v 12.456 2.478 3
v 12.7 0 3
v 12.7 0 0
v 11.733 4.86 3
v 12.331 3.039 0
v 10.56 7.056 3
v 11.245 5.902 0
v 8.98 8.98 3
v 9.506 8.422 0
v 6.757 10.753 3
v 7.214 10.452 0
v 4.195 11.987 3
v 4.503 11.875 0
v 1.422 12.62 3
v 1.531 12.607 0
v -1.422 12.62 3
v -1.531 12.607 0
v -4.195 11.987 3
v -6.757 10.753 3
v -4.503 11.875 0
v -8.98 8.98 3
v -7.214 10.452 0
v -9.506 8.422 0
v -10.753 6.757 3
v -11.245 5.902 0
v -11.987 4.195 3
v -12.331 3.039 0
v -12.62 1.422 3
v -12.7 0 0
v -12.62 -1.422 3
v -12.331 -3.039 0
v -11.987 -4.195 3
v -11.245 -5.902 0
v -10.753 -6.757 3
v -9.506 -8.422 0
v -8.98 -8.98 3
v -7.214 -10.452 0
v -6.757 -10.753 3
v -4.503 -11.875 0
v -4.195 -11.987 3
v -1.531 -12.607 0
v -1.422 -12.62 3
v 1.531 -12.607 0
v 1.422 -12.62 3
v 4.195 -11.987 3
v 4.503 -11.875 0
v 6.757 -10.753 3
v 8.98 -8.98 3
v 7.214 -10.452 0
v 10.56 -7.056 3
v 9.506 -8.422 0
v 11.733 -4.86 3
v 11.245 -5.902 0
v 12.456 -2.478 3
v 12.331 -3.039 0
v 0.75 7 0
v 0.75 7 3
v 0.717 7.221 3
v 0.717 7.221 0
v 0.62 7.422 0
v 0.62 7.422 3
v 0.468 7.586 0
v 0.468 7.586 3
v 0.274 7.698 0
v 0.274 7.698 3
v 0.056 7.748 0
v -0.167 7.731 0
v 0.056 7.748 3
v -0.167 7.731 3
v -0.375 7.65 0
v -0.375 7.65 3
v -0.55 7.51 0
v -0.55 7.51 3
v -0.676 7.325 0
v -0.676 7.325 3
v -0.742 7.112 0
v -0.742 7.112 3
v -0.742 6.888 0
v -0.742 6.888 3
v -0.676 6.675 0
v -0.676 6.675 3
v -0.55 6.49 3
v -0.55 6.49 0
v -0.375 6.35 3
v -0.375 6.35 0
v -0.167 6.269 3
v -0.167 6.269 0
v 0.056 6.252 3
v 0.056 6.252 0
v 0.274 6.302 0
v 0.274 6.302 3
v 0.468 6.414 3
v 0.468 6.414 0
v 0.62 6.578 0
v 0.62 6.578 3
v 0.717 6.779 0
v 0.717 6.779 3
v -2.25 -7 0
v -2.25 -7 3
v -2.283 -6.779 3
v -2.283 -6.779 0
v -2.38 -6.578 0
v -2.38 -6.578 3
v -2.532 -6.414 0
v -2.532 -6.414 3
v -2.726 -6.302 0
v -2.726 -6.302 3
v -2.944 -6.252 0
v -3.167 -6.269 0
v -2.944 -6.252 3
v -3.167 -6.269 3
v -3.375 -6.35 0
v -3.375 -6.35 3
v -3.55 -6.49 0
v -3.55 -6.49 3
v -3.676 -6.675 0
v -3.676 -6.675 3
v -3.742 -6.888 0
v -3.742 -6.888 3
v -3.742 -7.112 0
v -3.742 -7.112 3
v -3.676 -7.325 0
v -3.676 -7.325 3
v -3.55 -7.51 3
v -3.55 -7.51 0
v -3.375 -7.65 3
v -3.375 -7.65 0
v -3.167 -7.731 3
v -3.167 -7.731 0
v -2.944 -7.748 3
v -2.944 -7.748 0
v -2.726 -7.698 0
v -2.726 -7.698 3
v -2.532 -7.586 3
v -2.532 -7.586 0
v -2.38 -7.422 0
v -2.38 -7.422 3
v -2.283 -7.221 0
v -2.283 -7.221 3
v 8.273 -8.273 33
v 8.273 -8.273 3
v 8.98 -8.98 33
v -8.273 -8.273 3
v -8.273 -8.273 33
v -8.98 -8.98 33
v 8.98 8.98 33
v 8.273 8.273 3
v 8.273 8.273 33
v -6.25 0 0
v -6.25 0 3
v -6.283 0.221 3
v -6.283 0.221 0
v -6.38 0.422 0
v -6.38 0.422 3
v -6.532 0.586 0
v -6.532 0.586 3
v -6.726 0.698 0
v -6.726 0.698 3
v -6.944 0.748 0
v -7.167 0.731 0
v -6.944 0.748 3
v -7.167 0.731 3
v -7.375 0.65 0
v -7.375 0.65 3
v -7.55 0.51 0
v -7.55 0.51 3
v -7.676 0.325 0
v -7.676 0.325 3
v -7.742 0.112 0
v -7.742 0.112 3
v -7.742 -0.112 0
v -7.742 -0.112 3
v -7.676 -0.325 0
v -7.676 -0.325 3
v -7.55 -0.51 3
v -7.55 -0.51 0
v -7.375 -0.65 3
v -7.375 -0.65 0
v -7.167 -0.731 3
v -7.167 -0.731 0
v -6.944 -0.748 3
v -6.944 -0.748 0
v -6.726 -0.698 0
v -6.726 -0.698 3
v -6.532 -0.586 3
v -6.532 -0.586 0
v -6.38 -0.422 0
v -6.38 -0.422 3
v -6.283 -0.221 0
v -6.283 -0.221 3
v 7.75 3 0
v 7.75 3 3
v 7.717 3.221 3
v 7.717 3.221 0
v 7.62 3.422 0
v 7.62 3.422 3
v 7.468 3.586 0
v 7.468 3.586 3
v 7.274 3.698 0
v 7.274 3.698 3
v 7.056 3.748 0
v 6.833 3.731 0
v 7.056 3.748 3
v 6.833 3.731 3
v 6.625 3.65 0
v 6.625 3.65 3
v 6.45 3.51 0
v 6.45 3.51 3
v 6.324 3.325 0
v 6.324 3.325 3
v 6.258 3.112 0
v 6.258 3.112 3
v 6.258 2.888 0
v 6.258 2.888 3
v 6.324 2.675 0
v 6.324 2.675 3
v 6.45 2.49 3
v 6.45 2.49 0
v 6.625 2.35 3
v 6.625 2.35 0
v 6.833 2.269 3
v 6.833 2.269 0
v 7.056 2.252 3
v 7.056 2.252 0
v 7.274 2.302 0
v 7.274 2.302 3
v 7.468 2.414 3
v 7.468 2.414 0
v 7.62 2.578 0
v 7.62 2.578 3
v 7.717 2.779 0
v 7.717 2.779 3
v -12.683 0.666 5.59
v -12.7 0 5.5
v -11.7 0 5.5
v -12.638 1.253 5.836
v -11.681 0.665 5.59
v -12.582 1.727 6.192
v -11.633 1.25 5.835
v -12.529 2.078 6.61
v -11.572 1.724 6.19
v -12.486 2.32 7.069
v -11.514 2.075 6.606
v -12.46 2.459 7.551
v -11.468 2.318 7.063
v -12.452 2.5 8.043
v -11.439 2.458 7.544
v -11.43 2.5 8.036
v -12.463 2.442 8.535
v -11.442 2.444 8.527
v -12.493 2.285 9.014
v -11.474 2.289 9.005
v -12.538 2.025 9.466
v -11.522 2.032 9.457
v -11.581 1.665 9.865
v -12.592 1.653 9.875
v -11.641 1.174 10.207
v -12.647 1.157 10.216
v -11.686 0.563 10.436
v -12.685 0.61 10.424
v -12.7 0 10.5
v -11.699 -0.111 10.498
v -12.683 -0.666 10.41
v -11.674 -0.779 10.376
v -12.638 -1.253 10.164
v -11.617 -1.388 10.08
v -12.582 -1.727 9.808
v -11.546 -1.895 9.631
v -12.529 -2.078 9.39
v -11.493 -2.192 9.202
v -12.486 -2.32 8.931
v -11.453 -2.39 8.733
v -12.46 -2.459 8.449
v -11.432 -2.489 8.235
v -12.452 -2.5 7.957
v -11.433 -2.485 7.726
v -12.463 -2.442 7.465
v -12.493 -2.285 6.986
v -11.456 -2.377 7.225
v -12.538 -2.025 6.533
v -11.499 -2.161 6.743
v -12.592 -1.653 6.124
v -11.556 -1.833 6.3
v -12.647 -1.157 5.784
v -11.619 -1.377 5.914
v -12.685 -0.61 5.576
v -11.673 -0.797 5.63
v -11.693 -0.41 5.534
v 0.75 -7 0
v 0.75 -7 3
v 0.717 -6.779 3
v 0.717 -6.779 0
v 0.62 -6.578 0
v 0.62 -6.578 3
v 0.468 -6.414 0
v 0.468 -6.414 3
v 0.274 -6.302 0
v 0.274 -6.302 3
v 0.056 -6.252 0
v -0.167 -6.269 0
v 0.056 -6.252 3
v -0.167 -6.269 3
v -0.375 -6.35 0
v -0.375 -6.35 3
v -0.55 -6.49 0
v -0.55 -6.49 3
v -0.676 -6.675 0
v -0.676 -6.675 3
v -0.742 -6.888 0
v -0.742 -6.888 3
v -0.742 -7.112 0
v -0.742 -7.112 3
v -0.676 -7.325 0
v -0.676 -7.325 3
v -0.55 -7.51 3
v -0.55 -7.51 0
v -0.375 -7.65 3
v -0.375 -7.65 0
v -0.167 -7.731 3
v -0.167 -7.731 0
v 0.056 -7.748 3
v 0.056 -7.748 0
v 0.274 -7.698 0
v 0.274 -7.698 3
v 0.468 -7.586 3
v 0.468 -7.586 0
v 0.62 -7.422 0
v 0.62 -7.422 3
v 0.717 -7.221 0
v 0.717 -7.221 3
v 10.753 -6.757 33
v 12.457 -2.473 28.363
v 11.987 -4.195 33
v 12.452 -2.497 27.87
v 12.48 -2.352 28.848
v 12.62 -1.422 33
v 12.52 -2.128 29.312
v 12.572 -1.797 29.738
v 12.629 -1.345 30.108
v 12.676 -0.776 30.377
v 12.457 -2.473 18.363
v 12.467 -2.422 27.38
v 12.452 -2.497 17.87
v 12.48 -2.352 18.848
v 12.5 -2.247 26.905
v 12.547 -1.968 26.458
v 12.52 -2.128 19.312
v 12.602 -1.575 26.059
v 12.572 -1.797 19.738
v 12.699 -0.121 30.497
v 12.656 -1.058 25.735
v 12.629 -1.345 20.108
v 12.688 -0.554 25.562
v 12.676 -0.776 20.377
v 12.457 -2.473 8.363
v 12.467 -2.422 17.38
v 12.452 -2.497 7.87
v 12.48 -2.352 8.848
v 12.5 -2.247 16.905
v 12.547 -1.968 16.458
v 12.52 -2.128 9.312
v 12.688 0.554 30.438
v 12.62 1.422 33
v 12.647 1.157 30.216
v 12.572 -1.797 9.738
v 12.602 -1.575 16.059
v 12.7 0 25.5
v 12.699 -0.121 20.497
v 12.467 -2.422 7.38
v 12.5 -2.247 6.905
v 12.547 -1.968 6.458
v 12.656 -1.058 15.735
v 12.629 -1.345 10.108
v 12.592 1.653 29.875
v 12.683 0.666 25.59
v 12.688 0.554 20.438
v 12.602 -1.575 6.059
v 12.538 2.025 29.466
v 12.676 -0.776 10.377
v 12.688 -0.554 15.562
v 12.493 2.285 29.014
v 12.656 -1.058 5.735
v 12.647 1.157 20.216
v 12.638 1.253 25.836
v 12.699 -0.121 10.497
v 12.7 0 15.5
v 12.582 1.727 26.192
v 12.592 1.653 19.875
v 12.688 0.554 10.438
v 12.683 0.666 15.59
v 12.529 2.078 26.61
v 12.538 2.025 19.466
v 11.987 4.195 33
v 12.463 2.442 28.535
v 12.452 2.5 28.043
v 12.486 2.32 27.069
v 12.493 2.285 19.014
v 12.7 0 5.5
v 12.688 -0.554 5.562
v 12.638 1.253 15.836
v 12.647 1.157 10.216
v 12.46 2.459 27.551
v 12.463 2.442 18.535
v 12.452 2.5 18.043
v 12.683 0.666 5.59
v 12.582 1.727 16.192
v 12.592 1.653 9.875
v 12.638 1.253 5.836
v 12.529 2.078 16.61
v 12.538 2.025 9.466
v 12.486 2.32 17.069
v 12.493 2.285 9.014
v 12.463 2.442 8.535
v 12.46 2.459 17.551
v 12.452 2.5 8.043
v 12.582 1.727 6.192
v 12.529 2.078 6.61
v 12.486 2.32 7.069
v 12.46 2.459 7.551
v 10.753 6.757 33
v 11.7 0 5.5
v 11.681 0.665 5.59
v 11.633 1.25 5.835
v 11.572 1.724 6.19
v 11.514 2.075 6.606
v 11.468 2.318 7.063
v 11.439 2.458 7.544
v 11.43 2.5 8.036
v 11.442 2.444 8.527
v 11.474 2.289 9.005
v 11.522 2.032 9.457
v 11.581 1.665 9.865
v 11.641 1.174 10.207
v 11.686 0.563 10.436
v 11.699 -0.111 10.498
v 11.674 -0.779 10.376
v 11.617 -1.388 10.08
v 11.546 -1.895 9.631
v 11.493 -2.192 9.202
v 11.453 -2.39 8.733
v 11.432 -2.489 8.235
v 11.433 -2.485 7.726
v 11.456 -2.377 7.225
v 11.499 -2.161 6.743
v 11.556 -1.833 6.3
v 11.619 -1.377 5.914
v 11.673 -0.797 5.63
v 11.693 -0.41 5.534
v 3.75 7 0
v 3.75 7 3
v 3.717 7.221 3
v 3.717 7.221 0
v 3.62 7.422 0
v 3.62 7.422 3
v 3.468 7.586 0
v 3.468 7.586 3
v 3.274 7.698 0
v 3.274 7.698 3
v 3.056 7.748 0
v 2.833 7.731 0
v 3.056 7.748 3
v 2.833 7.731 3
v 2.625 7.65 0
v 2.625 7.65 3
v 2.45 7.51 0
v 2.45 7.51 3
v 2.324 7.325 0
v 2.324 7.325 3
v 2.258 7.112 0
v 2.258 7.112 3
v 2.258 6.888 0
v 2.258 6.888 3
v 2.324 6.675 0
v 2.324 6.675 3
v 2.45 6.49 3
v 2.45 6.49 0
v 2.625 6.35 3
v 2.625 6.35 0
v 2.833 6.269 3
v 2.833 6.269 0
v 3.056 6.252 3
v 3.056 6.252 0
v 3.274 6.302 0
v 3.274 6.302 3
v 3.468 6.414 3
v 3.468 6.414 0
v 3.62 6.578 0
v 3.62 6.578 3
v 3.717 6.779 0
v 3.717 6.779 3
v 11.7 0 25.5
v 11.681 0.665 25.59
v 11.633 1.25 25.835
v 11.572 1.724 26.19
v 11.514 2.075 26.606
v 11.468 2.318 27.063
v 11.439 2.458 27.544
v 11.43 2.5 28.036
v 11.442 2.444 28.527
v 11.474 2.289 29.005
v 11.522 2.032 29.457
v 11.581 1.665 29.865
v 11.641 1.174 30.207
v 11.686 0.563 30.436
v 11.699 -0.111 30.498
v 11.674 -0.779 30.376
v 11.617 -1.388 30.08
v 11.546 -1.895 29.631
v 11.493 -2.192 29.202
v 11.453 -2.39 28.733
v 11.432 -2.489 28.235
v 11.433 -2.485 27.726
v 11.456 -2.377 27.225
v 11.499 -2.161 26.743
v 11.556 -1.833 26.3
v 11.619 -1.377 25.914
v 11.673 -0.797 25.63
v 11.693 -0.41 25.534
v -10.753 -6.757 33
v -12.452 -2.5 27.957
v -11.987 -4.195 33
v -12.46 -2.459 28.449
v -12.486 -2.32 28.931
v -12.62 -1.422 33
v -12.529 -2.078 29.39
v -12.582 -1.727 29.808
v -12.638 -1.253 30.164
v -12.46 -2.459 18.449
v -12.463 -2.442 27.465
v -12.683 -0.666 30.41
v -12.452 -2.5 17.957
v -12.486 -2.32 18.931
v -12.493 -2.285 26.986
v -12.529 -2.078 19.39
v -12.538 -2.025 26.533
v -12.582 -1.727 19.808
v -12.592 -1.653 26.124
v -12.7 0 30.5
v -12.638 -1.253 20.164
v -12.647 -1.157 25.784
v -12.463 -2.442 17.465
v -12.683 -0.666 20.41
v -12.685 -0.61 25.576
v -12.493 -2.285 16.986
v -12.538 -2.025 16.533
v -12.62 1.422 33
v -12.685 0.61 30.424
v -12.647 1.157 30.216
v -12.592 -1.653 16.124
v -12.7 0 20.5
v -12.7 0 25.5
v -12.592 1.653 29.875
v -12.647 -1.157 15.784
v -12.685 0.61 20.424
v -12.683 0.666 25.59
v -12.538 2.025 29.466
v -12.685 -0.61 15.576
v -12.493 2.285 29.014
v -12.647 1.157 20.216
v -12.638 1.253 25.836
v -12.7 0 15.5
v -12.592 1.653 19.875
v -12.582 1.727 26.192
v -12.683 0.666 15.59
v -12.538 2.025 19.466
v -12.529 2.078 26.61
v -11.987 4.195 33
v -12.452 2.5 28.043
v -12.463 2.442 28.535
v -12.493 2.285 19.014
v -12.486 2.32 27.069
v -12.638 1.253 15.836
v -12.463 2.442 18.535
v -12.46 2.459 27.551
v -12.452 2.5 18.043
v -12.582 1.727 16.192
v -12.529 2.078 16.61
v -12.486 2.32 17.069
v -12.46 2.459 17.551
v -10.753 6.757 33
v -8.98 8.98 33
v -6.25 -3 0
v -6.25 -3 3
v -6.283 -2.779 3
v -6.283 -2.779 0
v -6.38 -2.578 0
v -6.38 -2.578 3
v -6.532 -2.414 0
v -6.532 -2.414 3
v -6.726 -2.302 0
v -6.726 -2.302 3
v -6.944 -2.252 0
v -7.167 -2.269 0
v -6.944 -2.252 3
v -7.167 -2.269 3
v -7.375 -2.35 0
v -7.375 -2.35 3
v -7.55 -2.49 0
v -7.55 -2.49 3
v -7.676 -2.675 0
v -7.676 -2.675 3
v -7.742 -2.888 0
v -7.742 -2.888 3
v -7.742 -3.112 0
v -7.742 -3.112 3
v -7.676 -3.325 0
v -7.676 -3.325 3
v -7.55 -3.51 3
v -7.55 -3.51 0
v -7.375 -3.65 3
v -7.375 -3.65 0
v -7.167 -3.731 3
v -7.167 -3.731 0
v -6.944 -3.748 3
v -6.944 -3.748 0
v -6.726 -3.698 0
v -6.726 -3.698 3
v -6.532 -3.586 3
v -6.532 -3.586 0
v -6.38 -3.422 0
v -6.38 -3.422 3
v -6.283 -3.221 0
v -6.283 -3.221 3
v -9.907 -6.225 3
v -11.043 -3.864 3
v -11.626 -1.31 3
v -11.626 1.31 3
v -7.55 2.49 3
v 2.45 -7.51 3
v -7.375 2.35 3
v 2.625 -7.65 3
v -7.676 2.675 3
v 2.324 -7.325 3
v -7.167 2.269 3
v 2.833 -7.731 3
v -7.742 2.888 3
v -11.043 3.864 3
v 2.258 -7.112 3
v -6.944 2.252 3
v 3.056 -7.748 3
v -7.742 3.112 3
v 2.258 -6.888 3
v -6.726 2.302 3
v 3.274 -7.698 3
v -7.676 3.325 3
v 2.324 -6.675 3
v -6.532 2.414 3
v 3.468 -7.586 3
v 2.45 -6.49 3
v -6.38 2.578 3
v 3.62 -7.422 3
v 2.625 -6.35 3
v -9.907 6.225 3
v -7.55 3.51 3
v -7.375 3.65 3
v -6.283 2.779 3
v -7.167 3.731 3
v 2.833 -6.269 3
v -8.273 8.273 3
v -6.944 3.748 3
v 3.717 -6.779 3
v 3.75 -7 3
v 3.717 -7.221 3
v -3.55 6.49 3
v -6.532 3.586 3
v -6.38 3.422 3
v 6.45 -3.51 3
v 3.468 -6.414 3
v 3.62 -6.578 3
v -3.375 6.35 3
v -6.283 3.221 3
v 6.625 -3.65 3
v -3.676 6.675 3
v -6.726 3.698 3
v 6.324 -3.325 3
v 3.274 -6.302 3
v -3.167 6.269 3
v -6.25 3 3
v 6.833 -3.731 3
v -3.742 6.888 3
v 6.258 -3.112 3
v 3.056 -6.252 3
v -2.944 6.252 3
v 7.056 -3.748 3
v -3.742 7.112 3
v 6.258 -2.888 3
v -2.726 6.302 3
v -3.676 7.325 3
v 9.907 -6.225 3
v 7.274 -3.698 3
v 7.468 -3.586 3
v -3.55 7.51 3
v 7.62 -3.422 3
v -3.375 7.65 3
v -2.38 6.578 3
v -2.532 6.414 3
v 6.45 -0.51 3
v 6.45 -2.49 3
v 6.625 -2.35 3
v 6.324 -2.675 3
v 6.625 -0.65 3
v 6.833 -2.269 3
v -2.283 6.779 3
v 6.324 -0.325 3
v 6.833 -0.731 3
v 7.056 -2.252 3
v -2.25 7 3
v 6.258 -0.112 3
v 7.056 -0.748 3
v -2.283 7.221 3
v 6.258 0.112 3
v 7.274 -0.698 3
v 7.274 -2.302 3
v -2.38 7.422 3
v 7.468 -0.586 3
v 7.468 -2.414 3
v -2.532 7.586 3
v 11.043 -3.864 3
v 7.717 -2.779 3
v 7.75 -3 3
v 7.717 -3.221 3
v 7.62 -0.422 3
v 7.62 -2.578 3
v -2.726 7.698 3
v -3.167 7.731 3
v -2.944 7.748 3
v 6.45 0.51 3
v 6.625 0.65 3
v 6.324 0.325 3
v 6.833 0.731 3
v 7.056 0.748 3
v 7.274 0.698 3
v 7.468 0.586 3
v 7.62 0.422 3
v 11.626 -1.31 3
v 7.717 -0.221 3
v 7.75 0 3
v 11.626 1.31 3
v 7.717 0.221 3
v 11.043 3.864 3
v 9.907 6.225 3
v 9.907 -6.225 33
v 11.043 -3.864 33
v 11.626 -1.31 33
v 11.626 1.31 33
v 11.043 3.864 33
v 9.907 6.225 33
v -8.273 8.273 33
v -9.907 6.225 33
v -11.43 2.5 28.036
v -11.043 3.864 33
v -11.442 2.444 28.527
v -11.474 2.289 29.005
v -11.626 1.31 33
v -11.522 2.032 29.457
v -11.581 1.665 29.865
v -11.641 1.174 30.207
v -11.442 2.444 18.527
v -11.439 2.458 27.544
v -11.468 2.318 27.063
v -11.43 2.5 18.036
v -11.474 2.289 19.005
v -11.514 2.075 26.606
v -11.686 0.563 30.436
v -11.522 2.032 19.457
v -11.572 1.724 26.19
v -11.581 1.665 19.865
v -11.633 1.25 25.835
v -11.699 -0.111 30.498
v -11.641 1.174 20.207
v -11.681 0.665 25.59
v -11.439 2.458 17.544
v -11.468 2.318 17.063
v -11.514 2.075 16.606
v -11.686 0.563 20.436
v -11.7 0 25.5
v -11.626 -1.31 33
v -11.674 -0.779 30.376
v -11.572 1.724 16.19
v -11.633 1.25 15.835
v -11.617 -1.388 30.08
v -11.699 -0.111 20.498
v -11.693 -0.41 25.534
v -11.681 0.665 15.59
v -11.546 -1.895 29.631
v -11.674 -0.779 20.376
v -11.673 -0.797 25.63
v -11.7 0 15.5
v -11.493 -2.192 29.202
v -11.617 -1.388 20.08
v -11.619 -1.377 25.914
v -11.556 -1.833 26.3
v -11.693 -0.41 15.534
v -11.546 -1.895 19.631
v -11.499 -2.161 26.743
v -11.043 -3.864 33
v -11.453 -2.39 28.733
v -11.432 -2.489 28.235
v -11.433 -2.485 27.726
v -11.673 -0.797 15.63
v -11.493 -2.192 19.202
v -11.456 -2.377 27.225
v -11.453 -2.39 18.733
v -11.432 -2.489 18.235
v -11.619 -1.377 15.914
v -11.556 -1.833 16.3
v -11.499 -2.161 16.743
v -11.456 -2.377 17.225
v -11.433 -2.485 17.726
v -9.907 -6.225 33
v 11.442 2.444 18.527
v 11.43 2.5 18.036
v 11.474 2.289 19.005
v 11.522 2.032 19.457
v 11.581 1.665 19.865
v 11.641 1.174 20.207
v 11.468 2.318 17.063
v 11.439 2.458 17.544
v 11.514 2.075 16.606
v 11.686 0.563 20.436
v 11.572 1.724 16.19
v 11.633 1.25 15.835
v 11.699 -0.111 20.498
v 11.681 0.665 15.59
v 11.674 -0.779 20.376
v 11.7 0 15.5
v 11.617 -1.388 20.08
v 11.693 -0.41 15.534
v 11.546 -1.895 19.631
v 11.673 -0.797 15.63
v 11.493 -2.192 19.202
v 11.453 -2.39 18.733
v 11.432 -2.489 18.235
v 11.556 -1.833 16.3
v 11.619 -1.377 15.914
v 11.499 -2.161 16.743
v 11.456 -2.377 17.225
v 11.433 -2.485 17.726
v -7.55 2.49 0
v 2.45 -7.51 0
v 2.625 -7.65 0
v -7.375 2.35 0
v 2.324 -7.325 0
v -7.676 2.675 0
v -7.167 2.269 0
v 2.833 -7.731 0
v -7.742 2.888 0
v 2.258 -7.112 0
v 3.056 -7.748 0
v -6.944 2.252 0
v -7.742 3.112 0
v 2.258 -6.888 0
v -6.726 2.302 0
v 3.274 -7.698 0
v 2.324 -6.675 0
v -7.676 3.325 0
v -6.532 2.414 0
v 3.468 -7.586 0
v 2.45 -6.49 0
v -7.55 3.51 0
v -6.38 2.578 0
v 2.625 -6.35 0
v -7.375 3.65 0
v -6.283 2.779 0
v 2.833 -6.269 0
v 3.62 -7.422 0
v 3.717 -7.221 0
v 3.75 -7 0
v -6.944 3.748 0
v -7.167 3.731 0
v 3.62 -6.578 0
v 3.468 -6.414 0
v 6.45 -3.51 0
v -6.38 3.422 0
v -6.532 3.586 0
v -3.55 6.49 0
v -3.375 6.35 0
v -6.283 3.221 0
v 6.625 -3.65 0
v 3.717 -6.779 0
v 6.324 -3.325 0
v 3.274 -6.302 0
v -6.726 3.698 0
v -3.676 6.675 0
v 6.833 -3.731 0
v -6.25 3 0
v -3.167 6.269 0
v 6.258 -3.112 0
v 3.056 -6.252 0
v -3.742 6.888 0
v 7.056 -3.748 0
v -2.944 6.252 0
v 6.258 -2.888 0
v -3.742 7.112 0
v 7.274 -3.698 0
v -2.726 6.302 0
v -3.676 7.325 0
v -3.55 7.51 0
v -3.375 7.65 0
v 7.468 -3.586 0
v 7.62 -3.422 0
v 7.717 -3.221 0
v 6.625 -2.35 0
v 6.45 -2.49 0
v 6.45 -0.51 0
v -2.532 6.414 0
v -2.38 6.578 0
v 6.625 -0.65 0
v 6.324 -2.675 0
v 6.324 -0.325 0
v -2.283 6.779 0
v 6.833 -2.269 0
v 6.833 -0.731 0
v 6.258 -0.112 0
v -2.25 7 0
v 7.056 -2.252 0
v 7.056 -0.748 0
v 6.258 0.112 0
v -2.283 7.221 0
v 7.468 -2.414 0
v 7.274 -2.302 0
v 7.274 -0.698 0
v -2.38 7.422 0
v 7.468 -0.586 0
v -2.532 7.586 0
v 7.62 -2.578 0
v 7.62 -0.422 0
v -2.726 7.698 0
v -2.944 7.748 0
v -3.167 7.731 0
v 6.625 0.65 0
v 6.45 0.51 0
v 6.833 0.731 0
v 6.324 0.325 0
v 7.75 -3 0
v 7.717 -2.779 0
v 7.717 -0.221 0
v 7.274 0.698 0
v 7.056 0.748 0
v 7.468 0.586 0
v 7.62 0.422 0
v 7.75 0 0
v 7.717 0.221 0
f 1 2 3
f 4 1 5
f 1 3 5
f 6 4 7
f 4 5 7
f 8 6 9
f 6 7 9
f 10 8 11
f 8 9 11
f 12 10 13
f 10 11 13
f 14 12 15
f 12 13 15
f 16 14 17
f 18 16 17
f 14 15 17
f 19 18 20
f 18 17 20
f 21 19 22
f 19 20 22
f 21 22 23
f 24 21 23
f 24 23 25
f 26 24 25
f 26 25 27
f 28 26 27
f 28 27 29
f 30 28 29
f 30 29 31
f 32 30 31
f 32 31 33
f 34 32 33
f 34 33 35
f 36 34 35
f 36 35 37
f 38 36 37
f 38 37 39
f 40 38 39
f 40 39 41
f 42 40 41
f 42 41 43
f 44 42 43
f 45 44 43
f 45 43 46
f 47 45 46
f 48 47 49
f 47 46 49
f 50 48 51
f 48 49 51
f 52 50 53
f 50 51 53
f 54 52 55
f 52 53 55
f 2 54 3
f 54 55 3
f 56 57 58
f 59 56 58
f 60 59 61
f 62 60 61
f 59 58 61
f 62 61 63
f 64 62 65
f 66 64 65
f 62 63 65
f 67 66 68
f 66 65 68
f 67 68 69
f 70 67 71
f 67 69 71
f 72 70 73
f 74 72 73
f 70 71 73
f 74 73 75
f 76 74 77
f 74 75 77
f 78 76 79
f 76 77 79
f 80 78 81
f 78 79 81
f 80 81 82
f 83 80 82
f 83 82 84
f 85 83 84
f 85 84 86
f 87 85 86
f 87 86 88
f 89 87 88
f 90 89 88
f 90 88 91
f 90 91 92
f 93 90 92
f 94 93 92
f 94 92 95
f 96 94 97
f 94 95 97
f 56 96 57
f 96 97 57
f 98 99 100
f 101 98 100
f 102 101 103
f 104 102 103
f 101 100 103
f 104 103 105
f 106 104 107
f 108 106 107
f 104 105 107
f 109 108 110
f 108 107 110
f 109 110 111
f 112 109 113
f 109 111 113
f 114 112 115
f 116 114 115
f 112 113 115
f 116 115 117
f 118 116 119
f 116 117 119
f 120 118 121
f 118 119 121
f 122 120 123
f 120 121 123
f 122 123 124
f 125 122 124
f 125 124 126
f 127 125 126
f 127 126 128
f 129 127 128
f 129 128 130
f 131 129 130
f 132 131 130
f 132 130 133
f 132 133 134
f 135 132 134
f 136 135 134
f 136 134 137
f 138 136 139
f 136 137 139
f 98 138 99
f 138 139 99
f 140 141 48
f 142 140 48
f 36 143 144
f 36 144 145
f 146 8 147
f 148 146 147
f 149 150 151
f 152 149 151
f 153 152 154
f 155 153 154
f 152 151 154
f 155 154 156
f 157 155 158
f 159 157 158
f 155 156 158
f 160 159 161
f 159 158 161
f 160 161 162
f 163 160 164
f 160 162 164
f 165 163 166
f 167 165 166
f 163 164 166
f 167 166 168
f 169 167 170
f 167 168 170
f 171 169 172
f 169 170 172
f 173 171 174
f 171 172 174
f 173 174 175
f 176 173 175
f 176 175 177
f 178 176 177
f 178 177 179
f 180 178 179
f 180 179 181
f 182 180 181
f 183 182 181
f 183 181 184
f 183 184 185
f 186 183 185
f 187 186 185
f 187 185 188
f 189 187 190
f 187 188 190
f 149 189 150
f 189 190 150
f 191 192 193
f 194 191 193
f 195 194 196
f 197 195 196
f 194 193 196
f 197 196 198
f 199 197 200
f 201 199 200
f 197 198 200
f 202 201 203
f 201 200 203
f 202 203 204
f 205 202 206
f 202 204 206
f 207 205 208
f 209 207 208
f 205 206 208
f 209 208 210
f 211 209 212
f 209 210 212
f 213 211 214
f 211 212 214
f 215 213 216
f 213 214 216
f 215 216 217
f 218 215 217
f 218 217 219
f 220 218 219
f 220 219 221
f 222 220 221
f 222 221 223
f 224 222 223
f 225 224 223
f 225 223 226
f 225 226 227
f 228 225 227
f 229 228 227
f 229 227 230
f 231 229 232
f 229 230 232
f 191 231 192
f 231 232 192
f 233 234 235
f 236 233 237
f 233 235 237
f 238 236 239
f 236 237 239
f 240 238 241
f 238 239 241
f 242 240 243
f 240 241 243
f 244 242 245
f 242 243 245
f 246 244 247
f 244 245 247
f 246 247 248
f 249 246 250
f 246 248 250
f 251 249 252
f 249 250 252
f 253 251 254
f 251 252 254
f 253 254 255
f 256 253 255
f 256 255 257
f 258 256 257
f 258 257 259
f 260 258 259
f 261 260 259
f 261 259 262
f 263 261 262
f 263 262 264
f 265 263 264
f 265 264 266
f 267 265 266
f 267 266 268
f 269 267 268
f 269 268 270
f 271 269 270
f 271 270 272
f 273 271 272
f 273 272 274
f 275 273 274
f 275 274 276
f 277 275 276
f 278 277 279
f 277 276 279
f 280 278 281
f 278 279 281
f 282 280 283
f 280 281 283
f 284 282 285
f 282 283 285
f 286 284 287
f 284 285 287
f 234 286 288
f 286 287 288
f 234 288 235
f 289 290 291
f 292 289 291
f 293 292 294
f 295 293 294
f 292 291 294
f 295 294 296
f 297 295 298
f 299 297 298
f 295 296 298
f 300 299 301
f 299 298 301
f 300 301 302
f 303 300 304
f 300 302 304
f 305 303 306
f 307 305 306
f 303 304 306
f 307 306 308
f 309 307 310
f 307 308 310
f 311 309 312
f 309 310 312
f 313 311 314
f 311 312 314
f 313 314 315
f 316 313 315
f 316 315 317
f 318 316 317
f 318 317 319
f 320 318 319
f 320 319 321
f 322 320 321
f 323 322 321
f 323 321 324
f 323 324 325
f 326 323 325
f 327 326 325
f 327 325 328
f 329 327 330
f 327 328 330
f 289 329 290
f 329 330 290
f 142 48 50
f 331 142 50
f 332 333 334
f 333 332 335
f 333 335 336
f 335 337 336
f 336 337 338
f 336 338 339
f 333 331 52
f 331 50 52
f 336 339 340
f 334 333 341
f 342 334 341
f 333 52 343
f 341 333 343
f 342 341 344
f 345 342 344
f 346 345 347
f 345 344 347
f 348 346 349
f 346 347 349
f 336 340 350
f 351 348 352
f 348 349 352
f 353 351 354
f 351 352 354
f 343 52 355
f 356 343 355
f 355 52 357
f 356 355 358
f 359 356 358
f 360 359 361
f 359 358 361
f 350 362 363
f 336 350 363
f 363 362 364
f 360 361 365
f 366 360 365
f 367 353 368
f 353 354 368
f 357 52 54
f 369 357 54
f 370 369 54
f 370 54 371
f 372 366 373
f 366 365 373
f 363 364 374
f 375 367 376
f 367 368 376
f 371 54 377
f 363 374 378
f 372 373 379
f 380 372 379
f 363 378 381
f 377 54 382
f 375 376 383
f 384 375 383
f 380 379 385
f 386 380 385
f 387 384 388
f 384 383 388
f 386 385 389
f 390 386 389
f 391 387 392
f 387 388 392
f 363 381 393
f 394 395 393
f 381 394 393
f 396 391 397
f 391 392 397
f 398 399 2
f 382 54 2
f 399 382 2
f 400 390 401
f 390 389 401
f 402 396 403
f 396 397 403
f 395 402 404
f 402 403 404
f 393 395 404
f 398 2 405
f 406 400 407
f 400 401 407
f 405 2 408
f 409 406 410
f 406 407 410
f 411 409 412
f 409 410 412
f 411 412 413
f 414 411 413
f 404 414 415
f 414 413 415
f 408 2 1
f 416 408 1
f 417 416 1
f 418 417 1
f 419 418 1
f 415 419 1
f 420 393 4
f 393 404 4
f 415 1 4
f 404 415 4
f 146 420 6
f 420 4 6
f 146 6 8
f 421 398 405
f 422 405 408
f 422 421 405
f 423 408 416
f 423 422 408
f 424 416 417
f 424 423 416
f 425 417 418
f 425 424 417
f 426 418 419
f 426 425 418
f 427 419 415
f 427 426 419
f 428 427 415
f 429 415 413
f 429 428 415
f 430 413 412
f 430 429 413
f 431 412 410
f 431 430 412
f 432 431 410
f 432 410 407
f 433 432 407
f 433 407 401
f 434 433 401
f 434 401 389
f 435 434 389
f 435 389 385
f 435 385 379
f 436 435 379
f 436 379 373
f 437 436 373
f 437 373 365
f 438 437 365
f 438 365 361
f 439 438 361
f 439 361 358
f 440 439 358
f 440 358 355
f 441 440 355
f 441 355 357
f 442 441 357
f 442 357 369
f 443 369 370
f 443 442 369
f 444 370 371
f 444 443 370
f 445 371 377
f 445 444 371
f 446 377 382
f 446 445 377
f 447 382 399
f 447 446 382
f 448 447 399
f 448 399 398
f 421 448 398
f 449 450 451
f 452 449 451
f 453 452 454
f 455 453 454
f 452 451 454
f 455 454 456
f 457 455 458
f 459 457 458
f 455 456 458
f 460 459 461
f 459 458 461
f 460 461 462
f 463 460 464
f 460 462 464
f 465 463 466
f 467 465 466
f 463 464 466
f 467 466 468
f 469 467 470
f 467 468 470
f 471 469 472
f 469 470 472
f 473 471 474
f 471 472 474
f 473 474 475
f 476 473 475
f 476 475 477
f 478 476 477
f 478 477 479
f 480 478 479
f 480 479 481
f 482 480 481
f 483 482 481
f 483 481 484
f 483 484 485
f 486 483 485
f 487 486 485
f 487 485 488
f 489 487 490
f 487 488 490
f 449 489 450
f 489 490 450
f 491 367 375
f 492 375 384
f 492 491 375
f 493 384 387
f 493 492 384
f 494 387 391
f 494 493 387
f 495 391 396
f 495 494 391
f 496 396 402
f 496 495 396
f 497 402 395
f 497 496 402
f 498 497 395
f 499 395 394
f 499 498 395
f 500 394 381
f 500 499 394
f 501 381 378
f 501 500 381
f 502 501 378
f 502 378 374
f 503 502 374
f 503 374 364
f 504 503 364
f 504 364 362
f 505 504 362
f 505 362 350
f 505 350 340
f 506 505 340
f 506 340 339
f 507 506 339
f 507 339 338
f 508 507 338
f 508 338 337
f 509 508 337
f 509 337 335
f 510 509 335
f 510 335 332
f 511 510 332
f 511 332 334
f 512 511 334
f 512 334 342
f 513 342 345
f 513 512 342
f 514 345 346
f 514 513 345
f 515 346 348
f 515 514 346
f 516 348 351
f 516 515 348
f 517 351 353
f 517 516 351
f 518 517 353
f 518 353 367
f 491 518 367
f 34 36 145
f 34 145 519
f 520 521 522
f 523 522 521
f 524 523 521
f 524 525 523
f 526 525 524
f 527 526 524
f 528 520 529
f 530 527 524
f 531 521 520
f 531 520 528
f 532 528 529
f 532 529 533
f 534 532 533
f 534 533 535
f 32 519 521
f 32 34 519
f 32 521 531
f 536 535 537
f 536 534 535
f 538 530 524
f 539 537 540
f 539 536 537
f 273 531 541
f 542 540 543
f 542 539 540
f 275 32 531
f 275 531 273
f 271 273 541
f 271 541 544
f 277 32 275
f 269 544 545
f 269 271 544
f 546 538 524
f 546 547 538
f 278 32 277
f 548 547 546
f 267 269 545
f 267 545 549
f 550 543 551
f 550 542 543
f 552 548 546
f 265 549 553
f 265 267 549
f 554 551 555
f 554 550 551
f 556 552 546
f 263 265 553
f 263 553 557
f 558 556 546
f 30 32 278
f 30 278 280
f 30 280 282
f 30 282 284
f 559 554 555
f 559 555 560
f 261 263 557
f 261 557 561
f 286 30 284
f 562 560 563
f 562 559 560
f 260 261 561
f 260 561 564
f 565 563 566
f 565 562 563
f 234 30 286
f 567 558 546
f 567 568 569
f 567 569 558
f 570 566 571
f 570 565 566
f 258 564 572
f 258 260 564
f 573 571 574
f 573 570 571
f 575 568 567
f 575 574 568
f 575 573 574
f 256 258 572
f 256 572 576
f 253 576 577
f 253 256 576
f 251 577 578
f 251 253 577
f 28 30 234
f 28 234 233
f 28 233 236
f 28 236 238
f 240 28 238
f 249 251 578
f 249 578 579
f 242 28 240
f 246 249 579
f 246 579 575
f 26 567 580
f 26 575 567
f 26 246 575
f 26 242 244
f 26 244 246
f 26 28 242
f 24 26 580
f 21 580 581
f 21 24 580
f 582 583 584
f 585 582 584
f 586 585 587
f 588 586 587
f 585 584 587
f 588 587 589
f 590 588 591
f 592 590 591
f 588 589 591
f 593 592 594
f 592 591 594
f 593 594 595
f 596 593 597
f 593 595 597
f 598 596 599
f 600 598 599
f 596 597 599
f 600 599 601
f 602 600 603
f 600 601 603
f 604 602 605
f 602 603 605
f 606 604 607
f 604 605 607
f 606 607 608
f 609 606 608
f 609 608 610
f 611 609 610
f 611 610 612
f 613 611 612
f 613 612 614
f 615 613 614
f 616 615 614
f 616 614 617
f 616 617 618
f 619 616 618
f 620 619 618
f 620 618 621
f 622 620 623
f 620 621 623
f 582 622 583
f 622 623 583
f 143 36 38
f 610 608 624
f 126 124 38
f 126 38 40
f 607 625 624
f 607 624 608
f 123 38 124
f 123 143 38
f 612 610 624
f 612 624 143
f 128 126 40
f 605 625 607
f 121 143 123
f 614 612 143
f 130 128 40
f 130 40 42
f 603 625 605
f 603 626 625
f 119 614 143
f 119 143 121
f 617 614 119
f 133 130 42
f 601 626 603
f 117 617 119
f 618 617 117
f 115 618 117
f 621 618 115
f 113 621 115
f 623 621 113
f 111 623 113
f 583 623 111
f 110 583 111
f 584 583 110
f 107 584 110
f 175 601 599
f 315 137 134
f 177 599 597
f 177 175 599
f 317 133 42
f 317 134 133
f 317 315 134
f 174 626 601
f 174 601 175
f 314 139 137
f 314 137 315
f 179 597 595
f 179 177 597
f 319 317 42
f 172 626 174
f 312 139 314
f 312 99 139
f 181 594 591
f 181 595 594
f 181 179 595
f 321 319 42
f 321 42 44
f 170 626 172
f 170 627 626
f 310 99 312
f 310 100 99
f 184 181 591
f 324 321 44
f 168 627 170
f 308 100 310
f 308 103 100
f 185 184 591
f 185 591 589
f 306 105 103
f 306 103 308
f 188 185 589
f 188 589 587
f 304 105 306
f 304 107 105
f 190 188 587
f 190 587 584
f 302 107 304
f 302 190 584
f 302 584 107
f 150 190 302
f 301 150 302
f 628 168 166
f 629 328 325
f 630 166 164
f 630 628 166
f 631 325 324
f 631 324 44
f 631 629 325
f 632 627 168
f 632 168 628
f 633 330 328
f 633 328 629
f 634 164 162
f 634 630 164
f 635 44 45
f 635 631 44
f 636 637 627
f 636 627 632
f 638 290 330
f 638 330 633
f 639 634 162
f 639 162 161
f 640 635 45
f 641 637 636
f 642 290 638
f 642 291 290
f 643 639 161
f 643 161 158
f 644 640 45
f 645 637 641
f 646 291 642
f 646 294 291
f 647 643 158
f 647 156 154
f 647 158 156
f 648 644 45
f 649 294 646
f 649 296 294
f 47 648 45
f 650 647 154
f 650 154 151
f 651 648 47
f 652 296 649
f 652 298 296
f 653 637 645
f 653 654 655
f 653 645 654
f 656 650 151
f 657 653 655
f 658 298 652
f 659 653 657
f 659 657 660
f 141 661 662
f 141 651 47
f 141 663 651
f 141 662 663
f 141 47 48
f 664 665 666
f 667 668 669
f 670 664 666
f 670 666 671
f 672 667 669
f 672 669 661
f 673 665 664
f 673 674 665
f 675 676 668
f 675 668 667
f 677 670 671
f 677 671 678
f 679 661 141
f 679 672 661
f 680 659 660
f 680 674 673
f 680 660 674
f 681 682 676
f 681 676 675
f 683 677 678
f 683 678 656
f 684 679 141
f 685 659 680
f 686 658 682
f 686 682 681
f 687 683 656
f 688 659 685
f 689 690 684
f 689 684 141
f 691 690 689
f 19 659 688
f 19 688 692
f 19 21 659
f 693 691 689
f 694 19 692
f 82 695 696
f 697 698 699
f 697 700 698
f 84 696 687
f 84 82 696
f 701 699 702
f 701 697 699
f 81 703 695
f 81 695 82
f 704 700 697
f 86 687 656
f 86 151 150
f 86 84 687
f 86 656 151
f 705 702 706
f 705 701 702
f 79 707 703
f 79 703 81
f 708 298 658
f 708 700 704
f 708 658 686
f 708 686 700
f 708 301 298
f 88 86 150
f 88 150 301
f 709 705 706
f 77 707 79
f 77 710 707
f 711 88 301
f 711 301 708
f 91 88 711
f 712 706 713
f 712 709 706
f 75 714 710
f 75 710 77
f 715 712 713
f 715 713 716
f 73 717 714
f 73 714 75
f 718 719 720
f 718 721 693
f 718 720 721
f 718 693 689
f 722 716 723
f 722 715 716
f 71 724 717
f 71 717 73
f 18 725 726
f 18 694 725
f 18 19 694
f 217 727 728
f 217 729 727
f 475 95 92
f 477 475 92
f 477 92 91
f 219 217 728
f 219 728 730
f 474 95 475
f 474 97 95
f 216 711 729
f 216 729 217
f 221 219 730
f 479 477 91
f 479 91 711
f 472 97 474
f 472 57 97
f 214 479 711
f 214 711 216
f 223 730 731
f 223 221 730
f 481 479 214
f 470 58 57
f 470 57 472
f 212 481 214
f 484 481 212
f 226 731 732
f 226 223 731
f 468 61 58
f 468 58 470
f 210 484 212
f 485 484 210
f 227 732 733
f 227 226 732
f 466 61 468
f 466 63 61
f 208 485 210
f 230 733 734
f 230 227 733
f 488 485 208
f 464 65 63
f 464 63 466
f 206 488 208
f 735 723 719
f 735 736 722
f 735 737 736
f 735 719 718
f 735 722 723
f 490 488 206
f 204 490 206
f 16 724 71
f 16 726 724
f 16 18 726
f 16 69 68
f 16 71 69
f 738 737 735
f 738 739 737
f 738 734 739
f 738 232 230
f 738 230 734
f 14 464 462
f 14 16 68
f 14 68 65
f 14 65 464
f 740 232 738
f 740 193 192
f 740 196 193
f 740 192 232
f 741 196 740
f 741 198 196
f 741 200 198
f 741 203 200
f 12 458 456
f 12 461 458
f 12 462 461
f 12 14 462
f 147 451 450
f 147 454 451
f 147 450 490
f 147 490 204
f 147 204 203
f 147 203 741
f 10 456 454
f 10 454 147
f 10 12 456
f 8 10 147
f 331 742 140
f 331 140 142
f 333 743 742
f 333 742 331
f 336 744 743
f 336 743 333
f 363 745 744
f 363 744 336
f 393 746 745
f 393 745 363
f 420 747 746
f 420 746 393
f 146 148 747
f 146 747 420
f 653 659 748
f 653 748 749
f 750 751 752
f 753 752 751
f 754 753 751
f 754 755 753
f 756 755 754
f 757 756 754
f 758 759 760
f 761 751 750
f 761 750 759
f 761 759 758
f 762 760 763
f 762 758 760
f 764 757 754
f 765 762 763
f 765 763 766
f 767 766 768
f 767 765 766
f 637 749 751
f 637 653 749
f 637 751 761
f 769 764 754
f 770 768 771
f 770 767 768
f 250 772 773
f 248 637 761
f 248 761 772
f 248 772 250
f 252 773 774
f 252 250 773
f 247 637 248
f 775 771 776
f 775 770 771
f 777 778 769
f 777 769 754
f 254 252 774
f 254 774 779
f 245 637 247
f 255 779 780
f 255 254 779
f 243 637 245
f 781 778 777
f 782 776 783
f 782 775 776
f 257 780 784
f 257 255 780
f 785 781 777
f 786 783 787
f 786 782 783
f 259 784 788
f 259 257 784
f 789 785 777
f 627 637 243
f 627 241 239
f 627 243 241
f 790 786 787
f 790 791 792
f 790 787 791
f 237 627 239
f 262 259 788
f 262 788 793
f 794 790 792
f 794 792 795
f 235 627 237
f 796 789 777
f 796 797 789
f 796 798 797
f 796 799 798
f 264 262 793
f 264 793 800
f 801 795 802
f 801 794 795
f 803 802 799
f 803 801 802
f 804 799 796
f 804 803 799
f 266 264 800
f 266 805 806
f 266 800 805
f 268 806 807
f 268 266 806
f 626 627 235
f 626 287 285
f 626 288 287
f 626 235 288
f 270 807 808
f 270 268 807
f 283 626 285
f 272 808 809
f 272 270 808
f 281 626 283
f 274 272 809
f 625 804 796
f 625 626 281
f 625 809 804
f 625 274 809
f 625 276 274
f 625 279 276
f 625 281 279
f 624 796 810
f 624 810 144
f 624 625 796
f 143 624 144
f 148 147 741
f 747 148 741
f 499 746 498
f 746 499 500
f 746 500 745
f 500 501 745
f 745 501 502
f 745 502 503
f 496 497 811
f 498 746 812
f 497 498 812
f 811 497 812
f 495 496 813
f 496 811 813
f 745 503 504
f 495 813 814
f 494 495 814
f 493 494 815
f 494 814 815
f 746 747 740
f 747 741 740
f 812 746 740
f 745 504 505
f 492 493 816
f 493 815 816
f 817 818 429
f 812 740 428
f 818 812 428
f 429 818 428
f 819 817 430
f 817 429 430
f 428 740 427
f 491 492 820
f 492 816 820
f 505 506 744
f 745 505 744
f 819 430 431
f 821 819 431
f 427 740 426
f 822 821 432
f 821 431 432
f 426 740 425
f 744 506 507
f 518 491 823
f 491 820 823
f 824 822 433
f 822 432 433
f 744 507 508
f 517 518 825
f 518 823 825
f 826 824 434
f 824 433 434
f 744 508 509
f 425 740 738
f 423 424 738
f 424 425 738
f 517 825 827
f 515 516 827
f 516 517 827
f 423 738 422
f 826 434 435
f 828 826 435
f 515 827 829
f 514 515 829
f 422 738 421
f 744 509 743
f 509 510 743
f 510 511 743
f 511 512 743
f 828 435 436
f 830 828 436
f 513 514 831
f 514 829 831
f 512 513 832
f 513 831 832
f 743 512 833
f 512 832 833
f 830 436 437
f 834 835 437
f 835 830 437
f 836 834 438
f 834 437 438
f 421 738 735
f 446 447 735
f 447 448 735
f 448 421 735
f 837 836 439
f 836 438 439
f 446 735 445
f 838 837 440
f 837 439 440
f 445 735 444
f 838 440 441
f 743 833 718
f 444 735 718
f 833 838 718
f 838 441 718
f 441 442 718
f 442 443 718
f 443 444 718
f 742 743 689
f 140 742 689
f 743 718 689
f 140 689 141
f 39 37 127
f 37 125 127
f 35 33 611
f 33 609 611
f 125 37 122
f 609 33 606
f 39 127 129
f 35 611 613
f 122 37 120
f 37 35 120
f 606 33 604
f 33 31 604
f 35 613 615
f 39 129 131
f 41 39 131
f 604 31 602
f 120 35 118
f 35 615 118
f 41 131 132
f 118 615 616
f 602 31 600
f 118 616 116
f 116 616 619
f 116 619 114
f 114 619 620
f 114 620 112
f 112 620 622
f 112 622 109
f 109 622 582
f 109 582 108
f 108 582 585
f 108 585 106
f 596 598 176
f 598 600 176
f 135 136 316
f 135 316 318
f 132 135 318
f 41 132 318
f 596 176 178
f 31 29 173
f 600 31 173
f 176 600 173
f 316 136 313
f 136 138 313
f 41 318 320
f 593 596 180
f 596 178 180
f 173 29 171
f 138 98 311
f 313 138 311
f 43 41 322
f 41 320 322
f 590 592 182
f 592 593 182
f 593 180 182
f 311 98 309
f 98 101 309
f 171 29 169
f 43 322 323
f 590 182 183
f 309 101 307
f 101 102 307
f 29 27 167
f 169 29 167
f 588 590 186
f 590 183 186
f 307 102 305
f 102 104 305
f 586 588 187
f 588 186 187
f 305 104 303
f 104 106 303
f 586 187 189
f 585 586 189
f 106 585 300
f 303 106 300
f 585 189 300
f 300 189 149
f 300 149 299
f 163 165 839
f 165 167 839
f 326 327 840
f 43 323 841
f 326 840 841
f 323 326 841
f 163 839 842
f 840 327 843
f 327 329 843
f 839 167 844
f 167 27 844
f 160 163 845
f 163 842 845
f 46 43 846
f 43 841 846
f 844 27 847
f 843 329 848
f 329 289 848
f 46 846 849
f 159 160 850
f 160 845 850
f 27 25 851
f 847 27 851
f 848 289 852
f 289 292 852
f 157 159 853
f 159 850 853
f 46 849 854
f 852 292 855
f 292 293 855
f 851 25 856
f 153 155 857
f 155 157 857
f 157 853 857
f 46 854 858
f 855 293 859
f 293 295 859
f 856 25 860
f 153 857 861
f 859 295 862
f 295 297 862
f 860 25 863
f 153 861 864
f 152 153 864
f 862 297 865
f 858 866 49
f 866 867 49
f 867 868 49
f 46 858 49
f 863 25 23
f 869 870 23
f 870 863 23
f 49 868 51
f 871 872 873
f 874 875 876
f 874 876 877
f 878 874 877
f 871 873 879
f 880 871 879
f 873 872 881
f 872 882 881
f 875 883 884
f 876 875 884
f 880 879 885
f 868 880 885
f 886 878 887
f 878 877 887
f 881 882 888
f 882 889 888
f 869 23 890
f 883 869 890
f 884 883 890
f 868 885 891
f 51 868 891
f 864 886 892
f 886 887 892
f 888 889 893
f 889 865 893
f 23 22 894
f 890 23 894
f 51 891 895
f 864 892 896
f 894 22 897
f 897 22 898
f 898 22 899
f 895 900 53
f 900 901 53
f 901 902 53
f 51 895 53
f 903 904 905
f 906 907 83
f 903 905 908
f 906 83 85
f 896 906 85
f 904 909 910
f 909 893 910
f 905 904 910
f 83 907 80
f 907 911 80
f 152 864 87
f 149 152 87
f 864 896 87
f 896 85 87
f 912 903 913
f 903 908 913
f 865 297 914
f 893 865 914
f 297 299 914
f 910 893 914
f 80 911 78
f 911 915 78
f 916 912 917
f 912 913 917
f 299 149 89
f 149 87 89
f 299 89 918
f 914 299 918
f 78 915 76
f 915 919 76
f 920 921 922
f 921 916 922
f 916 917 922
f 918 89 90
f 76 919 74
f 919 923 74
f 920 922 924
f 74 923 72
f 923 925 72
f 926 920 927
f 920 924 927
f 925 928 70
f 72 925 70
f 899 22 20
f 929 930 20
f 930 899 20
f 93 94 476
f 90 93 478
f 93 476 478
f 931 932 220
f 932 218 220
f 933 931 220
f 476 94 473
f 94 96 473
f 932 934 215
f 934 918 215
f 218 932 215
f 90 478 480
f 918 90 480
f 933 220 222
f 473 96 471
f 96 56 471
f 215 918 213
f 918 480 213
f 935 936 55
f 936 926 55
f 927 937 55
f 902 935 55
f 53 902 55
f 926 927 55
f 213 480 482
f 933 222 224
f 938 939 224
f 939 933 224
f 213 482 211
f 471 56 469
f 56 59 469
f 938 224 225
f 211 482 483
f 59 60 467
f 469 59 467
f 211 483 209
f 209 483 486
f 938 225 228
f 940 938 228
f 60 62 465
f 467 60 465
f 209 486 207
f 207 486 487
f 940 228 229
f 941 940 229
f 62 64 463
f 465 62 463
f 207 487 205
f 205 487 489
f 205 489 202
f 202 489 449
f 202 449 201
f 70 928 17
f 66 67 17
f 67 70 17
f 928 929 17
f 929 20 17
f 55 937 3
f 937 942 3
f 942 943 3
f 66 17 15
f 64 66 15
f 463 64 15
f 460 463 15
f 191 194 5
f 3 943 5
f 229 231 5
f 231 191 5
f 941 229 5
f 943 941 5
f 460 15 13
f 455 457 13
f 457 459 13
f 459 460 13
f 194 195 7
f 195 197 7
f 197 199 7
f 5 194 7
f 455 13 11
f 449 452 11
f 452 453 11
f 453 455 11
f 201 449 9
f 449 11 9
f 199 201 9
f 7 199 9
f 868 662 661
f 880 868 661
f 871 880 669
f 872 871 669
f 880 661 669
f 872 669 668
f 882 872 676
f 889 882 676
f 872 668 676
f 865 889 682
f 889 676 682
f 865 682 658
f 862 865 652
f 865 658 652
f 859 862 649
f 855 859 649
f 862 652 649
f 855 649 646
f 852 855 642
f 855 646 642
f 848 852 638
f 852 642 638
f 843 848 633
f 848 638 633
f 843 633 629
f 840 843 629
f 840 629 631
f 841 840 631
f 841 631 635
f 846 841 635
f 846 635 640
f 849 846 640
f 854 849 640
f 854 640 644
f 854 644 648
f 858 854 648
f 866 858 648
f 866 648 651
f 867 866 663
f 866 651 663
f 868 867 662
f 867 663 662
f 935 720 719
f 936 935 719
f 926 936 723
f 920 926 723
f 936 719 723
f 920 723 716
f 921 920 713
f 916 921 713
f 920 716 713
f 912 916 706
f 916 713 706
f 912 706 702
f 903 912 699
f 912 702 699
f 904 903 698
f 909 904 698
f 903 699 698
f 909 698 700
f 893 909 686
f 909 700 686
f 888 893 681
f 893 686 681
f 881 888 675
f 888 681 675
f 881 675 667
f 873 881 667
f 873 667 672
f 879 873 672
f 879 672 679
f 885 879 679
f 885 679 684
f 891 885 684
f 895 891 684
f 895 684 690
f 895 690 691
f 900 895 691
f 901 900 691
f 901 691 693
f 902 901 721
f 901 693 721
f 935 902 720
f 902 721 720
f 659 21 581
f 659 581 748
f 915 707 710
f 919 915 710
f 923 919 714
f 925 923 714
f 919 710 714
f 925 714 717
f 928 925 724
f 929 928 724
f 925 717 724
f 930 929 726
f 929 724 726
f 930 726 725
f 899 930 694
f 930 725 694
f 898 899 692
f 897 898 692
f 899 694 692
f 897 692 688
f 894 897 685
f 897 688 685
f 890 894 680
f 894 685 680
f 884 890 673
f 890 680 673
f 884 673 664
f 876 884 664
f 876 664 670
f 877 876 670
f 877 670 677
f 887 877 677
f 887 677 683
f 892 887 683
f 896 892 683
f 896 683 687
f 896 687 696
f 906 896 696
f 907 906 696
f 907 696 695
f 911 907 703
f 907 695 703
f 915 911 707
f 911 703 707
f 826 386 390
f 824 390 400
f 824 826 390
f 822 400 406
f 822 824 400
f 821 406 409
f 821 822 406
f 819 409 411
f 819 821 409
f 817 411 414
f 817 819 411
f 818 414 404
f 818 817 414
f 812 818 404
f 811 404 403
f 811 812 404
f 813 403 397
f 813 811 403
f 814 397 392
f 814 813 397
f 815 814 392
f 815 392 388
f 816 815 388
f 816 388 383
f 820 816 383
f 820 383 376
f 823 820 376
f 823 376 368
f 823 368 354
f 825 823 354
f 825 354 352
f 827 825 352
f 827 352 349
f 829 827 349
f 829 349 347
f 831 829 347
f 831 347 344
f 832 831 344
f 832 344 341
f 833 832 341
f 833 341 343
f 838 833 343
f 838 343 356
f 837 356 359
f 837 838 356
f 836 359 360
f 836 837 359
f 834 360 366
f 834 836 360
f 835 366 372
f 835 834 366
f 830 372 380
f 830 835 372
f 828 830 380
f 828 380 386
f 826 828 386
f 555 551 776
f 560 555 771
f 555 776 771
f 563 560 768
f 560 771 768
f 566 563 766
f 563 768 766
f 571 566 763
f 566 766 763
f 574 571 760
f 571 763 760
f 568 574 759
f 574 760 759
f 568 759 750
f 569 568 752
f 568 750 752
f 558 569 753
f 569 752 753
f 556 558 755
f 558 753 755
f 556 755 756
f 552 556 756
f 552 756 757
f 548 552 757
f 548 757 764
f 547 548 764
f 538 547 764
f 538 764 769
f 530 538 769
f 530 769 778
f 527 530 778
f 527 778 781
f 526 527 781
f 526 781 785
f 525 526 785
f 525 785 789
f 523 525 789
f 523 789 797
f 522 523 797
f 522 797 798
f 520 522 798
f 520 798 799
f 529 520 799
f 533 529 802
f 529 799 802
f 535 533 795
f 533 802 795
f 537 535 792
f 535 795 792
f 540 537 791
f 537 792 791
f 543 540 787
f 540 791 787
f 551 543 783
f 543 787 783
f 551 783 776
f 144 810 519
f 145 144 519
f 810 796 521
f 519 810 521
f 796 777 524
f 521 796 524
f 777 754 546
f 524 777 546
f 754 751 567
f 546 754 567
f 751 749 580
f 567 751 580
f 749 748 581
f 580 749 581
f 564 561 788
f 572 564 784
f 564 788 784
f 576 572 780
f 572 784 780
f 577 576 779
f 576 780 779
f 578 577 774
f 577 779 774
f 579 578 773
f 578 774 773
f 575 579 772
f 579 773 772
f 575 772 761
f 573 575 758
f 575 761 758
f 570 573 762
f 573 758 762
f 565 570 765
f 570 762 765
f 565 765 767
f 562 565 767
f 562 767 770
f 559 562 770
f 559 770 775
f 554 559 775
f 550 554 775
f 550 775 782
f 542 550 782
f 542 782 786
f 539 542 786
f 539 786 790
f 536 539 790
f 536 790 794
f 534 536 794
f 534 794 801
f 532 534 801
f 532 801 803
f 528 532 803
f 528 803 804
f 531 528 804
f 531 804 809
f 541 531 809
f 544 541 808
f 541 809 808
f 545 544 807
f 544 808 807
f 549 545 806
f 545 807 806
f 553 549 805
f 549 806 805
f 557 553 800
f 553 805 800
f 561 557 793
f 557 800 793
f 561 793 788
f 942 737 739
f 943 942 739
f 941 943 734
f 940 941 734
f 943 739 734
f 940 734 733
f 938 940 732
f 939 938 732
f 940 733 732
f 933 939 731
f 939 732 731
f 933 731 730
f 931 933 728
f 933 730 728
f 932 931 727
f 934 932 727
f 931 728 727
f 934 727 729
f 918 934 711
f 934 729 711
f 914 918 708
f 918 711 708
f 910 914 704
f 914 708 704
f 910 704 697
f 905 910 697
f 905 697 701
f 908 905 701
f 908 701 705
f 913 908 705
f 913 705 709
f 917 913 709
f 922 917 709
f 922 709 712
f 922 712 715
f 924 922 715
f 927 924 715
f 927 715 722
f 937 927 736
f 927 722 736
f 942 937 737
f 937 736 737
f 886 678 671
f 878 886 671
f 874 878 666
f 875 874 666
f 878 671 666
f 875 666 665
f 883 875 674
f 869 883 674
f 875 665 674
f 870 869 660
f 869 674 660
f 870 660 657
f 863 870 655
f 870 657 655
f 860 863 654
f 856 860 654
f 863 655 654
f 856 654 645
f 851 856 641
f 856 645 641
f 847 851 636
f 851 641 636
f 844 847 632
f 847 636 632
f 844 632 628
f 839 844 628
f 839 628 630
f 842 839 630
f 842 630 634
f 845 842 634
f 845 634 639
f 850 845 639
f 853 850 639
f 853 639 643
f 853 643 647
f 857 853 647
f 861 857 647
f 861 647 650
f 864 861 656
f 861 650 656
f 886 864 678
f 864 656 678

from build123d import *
from build123d.topology import SkipClean

# Parameters (mm, degrees)
SKETCH1_R                           = 12.7
BOSS_EXTRUDE1_DEPTH                 = 3
SKETCH2_R                           = 0.75
CUT_EXTRUDE1_DEPTH                  = 3
BOSS_EXTRUDE2_DEPTH                 = 30
CUT_EXTRUDE2_REACH                  = 39.571
CUT_EXTRUDE2_END_RADIUS             = 12.7
SKETCH4_R                           = 2.5
CUT_EXTRUDE2_DIRECTION_2_REACH      = 39.571
CUT_EXTRUDE2_DIRECTION_2_END_RADIUS = 12.7


with BuildPart() as part:
    # Sketch1 → Boss-Extrude1 (new body)
    with BuildSketch(Plane.XY):
        Circle(SKETCH1_R)
    extrude(amount=BOSS_EXTRUDE1_DEPTH)

    # Sketch2 → Cut-Extrude1 (cut)
    with BuildSketch(Plane.XY.offset(3)):
        with Locations((0, 7)):
            Circle(SKETCH2_R)
        with Locations((-3, 7)):
            Circle(SKETCH2_R)
        with Locations((3, 7)):
            Circle(SKETCH2_R)
        with Locations((7, -3)):
            Circle(SKETCH2_R)
        with Locations((7, 0)):
            Circle(SKETCH2_R)
        with Locations((7, 3)):
            Circle(SKETCH2_R)
        with Locations((-3, -7)):
            Circle(SKETCH2_R)
        with Locations((0, -7)):
            Circle(SKETCH2_R)
        with Locations((3, -7)):
            Circle(SKETCH2_R)
        with Locations((-7, 3)):
            Circle(SKETCH2_R)
        with Locations((-7, 0)):
            Circle(SKETCH2_R)
        with Locations((-7, -3)):
            Circle(SKETCH2_R)
    extrude(amount=-CUT_EXTRUDE1_DEPTH, mode=Mode.SUBTRACT)

    # Sketch3 → Boss-Extrude2 (add)
    with SkipClean():  # the faces are left unmerged after this step: merging them gives an invalid solid
        with BuildSketch(Plane.XY.offset(3)):
            with BuildLine():
                Line((-8.980256121, 8.980256121), (-8.273149436, 8.273149436))
                ThreePointArc((-8.273149436, 8.273149436), (-11.700000136, 0), (-8.27314937, -8.27314937))
                Line((-8.27314937, -8.27314937), (-8.980256121, -8.980256121))
                ThreePointArc((-8.980256121, -8.980256121), (-12.7, 0), (-8.980256121, 8.980256121))
            make_face()
            with BuildLine():
                Line((8.980256121, 8.980256121), (8.273149436, 8.273149436))
                ThreePointArc((8.273149436, 8.273149436), (11.700000136, 0), (8.27314937, -8.27314937))
                Line((8.27314937, -8.27314937), (8.980256121, -8.980256121))
                ThreePointArc((8.980256121, -8.980256121), (12.7, 0), (8.980256121, 8.980256121))
            make_face()
        extrude(amount=BOSS_EXTRUDE2_DEPTH)

    # Cut-Extrude2: up to this cylinder (the profile starts inside it)
    with SkipClean():  # the faces are left unmerged after this step: merging them gives an invalid solid
        cut_extrude2_end = Plane(origin=(0, 0, 18), z_dir=(0, 0, -1)) * Cylinder(CUT_EXTRUDE2_END_RADIUS, 125.542, mode=Mode.PRIVATE)
        # Sketch4 → Cut-Extrude2 (cut, up to the surface)
        with BuildSketch(Plane(origin=(0, 0, 0), x_dir=(0, 0, -1), z_dir=(1, 0, 0)), mode=Mode.PRIVATE) as cut_extrude2_sk1:
            with Locations((-8, 0)):
                Circle(SKETCH4_R)
        cut_extrude2_tool1 = extrude(cut_extrude2_sk1.sketch, amount=-CUT_EXTRUDE2_REACH, mode=Mode.PRIVATE) & cut_extrude2_end
        add(cut_extrude2_tool1.solids().sort_by_distance((0, 0, 8))[0], mode=Mode.SUBTRACT)
        # Sketch4 → Cut-Extrude2 (cut, up to the surface)
        with BuildSketch(Plane(origin=(0, 0, 0), x_dir=(0, 0, -1), z_dir=(1, 0, 0)), mode=Mode.PRIVATE) as cut_extrude2_sk2:
            with Locations((-18, 0)):
                Circle(SKETCH4_R)
        cut_extrude2_tool2 = extrude(cut_extrude2_sk2.sketch, amount=-CUT_EXTRUDE2_REACH, mode=Mode.PRIVATE) & cut_extrude2_end
        add(cut_extrude2_tool2.solids().sort_by_distance((0, 0, 18))[0], mode=Mode.SUBTRACT)
        # Sketch4 → Cut-Extrude2 (cut, up to the surface)
        with BuildSketch(Plane(origin=(0, 0, 0), x_dir=(0, 0, -1), z_dir=(1, 0, 0)), mode=Mode.PRIVATE) as cut_extrude2_sk3:
            with Locations((-28, 0)):
                Circle(SKETCH4_R)
        cut_extrude2_tool3 = extrude(cut_extrude2_sk3.sketch, amount=-CUT_EXTRUDE2_REACH, mode=Mode.PRIVATE) & cut_extrude2_end
        add(cut_extrude2_tool3.solids().sort_by_distance((0, 0, 28))[0], mode=Mode.SUBTRACT)

    # Cut-Extrude2 direction 2: up to this cylinder (the profile starts inside it)
    with SkipClean():  # the faces are left unmerged after this step: merging them gives an invalid solid
        cut_extrude2_direction_2_end = Plane(origin=(0, 0, 18), z_dir=(0, 0, -1)) * Cylinder(CUT_EXTRUDE2_DIRECTION_2_END_RADIUS, 125.542, mode=Mode.PRIVATE)
        # Sketch4 → Cut-Extrude2 direction 2 (cut, up to the surface)
        with BuildSketch(Plane(origin=(0, 0, 0), x_dir=(0, 0, -1), z_dir=(1, 0, 0)), mode=Mode.PRIVATE) as cut_extrude2_direction_2_sk1:
            with Locations((-8, 0)):
                Circle(SKETCH4_R)
        cut_extrude2_direction_2_tool1 = extrude(cut_extrude2_direction_2_sk1.sketch, amount=CUT_EXTRUDE2_DIRECTION_2_REACH, mode=Mode.PRIVATE) & cut_extrude2_direction_2_end
        add(cut_extrude2_direction_2_tool1.solids().sort_by_distance((0, 0, 8))[0], mode=Mode.SUBTRACT)
        # Sketch4 → Cut-Extrude2 direction 2 (cut, up to the surface)
        with BuildSketch(Plane(origin=(0, 0, 0), x_dir=(0, 0, -1), z_dir=(1, 0, 0)), mode=Mode.PRIVATE) as cut_extrude2_direction_2_sk2:
            with Locations((-18, 0)):
                Circle(SKETCH4_R)
        cut_extrude2_direction_2_tool2 = extrude(cut_extrude2_direction_2_sk2.sketch, amount=CUT_EXTRUDE2_DIRECTION_2_REACH, mode=Mode.PRIVATE) & cut_extrude2_direction_2_end
        add(cut_extrude2_direction_2_tool2.solids().sort_by_distance((0, 0, 18))[0], mode=Mode.SUBTRACT)
        # Sketch4 → Cut-Extrude2 direction 2 (cut, up to the surface)
        with BuildSketch(Plane(origin=(0, 0, 0), x_dir=(0, 0, -1), z_dir=(1, 0, 0)), mode=Mode.PRIVATE) as cut_extrude2_direction_2_sk3:
            with Locations((-28, 0)):
                Circle(SKETCH4_R)
        cut_extrude2_direction_2_tool3 = extrude(cut_extrude2_direction_2_sk3.sketch, amount=CUT_EXTRUDE2_DIRECTION_2_REACH, mode=Mode.PRIVATE) & cut_extrude2_direction_2_end
        add(cut_extrude2_direction_2_tool3.solids().sort_by_distance((0, 0, 28))[0], mode=Mode.SUBTRACT)


solid = part.part
